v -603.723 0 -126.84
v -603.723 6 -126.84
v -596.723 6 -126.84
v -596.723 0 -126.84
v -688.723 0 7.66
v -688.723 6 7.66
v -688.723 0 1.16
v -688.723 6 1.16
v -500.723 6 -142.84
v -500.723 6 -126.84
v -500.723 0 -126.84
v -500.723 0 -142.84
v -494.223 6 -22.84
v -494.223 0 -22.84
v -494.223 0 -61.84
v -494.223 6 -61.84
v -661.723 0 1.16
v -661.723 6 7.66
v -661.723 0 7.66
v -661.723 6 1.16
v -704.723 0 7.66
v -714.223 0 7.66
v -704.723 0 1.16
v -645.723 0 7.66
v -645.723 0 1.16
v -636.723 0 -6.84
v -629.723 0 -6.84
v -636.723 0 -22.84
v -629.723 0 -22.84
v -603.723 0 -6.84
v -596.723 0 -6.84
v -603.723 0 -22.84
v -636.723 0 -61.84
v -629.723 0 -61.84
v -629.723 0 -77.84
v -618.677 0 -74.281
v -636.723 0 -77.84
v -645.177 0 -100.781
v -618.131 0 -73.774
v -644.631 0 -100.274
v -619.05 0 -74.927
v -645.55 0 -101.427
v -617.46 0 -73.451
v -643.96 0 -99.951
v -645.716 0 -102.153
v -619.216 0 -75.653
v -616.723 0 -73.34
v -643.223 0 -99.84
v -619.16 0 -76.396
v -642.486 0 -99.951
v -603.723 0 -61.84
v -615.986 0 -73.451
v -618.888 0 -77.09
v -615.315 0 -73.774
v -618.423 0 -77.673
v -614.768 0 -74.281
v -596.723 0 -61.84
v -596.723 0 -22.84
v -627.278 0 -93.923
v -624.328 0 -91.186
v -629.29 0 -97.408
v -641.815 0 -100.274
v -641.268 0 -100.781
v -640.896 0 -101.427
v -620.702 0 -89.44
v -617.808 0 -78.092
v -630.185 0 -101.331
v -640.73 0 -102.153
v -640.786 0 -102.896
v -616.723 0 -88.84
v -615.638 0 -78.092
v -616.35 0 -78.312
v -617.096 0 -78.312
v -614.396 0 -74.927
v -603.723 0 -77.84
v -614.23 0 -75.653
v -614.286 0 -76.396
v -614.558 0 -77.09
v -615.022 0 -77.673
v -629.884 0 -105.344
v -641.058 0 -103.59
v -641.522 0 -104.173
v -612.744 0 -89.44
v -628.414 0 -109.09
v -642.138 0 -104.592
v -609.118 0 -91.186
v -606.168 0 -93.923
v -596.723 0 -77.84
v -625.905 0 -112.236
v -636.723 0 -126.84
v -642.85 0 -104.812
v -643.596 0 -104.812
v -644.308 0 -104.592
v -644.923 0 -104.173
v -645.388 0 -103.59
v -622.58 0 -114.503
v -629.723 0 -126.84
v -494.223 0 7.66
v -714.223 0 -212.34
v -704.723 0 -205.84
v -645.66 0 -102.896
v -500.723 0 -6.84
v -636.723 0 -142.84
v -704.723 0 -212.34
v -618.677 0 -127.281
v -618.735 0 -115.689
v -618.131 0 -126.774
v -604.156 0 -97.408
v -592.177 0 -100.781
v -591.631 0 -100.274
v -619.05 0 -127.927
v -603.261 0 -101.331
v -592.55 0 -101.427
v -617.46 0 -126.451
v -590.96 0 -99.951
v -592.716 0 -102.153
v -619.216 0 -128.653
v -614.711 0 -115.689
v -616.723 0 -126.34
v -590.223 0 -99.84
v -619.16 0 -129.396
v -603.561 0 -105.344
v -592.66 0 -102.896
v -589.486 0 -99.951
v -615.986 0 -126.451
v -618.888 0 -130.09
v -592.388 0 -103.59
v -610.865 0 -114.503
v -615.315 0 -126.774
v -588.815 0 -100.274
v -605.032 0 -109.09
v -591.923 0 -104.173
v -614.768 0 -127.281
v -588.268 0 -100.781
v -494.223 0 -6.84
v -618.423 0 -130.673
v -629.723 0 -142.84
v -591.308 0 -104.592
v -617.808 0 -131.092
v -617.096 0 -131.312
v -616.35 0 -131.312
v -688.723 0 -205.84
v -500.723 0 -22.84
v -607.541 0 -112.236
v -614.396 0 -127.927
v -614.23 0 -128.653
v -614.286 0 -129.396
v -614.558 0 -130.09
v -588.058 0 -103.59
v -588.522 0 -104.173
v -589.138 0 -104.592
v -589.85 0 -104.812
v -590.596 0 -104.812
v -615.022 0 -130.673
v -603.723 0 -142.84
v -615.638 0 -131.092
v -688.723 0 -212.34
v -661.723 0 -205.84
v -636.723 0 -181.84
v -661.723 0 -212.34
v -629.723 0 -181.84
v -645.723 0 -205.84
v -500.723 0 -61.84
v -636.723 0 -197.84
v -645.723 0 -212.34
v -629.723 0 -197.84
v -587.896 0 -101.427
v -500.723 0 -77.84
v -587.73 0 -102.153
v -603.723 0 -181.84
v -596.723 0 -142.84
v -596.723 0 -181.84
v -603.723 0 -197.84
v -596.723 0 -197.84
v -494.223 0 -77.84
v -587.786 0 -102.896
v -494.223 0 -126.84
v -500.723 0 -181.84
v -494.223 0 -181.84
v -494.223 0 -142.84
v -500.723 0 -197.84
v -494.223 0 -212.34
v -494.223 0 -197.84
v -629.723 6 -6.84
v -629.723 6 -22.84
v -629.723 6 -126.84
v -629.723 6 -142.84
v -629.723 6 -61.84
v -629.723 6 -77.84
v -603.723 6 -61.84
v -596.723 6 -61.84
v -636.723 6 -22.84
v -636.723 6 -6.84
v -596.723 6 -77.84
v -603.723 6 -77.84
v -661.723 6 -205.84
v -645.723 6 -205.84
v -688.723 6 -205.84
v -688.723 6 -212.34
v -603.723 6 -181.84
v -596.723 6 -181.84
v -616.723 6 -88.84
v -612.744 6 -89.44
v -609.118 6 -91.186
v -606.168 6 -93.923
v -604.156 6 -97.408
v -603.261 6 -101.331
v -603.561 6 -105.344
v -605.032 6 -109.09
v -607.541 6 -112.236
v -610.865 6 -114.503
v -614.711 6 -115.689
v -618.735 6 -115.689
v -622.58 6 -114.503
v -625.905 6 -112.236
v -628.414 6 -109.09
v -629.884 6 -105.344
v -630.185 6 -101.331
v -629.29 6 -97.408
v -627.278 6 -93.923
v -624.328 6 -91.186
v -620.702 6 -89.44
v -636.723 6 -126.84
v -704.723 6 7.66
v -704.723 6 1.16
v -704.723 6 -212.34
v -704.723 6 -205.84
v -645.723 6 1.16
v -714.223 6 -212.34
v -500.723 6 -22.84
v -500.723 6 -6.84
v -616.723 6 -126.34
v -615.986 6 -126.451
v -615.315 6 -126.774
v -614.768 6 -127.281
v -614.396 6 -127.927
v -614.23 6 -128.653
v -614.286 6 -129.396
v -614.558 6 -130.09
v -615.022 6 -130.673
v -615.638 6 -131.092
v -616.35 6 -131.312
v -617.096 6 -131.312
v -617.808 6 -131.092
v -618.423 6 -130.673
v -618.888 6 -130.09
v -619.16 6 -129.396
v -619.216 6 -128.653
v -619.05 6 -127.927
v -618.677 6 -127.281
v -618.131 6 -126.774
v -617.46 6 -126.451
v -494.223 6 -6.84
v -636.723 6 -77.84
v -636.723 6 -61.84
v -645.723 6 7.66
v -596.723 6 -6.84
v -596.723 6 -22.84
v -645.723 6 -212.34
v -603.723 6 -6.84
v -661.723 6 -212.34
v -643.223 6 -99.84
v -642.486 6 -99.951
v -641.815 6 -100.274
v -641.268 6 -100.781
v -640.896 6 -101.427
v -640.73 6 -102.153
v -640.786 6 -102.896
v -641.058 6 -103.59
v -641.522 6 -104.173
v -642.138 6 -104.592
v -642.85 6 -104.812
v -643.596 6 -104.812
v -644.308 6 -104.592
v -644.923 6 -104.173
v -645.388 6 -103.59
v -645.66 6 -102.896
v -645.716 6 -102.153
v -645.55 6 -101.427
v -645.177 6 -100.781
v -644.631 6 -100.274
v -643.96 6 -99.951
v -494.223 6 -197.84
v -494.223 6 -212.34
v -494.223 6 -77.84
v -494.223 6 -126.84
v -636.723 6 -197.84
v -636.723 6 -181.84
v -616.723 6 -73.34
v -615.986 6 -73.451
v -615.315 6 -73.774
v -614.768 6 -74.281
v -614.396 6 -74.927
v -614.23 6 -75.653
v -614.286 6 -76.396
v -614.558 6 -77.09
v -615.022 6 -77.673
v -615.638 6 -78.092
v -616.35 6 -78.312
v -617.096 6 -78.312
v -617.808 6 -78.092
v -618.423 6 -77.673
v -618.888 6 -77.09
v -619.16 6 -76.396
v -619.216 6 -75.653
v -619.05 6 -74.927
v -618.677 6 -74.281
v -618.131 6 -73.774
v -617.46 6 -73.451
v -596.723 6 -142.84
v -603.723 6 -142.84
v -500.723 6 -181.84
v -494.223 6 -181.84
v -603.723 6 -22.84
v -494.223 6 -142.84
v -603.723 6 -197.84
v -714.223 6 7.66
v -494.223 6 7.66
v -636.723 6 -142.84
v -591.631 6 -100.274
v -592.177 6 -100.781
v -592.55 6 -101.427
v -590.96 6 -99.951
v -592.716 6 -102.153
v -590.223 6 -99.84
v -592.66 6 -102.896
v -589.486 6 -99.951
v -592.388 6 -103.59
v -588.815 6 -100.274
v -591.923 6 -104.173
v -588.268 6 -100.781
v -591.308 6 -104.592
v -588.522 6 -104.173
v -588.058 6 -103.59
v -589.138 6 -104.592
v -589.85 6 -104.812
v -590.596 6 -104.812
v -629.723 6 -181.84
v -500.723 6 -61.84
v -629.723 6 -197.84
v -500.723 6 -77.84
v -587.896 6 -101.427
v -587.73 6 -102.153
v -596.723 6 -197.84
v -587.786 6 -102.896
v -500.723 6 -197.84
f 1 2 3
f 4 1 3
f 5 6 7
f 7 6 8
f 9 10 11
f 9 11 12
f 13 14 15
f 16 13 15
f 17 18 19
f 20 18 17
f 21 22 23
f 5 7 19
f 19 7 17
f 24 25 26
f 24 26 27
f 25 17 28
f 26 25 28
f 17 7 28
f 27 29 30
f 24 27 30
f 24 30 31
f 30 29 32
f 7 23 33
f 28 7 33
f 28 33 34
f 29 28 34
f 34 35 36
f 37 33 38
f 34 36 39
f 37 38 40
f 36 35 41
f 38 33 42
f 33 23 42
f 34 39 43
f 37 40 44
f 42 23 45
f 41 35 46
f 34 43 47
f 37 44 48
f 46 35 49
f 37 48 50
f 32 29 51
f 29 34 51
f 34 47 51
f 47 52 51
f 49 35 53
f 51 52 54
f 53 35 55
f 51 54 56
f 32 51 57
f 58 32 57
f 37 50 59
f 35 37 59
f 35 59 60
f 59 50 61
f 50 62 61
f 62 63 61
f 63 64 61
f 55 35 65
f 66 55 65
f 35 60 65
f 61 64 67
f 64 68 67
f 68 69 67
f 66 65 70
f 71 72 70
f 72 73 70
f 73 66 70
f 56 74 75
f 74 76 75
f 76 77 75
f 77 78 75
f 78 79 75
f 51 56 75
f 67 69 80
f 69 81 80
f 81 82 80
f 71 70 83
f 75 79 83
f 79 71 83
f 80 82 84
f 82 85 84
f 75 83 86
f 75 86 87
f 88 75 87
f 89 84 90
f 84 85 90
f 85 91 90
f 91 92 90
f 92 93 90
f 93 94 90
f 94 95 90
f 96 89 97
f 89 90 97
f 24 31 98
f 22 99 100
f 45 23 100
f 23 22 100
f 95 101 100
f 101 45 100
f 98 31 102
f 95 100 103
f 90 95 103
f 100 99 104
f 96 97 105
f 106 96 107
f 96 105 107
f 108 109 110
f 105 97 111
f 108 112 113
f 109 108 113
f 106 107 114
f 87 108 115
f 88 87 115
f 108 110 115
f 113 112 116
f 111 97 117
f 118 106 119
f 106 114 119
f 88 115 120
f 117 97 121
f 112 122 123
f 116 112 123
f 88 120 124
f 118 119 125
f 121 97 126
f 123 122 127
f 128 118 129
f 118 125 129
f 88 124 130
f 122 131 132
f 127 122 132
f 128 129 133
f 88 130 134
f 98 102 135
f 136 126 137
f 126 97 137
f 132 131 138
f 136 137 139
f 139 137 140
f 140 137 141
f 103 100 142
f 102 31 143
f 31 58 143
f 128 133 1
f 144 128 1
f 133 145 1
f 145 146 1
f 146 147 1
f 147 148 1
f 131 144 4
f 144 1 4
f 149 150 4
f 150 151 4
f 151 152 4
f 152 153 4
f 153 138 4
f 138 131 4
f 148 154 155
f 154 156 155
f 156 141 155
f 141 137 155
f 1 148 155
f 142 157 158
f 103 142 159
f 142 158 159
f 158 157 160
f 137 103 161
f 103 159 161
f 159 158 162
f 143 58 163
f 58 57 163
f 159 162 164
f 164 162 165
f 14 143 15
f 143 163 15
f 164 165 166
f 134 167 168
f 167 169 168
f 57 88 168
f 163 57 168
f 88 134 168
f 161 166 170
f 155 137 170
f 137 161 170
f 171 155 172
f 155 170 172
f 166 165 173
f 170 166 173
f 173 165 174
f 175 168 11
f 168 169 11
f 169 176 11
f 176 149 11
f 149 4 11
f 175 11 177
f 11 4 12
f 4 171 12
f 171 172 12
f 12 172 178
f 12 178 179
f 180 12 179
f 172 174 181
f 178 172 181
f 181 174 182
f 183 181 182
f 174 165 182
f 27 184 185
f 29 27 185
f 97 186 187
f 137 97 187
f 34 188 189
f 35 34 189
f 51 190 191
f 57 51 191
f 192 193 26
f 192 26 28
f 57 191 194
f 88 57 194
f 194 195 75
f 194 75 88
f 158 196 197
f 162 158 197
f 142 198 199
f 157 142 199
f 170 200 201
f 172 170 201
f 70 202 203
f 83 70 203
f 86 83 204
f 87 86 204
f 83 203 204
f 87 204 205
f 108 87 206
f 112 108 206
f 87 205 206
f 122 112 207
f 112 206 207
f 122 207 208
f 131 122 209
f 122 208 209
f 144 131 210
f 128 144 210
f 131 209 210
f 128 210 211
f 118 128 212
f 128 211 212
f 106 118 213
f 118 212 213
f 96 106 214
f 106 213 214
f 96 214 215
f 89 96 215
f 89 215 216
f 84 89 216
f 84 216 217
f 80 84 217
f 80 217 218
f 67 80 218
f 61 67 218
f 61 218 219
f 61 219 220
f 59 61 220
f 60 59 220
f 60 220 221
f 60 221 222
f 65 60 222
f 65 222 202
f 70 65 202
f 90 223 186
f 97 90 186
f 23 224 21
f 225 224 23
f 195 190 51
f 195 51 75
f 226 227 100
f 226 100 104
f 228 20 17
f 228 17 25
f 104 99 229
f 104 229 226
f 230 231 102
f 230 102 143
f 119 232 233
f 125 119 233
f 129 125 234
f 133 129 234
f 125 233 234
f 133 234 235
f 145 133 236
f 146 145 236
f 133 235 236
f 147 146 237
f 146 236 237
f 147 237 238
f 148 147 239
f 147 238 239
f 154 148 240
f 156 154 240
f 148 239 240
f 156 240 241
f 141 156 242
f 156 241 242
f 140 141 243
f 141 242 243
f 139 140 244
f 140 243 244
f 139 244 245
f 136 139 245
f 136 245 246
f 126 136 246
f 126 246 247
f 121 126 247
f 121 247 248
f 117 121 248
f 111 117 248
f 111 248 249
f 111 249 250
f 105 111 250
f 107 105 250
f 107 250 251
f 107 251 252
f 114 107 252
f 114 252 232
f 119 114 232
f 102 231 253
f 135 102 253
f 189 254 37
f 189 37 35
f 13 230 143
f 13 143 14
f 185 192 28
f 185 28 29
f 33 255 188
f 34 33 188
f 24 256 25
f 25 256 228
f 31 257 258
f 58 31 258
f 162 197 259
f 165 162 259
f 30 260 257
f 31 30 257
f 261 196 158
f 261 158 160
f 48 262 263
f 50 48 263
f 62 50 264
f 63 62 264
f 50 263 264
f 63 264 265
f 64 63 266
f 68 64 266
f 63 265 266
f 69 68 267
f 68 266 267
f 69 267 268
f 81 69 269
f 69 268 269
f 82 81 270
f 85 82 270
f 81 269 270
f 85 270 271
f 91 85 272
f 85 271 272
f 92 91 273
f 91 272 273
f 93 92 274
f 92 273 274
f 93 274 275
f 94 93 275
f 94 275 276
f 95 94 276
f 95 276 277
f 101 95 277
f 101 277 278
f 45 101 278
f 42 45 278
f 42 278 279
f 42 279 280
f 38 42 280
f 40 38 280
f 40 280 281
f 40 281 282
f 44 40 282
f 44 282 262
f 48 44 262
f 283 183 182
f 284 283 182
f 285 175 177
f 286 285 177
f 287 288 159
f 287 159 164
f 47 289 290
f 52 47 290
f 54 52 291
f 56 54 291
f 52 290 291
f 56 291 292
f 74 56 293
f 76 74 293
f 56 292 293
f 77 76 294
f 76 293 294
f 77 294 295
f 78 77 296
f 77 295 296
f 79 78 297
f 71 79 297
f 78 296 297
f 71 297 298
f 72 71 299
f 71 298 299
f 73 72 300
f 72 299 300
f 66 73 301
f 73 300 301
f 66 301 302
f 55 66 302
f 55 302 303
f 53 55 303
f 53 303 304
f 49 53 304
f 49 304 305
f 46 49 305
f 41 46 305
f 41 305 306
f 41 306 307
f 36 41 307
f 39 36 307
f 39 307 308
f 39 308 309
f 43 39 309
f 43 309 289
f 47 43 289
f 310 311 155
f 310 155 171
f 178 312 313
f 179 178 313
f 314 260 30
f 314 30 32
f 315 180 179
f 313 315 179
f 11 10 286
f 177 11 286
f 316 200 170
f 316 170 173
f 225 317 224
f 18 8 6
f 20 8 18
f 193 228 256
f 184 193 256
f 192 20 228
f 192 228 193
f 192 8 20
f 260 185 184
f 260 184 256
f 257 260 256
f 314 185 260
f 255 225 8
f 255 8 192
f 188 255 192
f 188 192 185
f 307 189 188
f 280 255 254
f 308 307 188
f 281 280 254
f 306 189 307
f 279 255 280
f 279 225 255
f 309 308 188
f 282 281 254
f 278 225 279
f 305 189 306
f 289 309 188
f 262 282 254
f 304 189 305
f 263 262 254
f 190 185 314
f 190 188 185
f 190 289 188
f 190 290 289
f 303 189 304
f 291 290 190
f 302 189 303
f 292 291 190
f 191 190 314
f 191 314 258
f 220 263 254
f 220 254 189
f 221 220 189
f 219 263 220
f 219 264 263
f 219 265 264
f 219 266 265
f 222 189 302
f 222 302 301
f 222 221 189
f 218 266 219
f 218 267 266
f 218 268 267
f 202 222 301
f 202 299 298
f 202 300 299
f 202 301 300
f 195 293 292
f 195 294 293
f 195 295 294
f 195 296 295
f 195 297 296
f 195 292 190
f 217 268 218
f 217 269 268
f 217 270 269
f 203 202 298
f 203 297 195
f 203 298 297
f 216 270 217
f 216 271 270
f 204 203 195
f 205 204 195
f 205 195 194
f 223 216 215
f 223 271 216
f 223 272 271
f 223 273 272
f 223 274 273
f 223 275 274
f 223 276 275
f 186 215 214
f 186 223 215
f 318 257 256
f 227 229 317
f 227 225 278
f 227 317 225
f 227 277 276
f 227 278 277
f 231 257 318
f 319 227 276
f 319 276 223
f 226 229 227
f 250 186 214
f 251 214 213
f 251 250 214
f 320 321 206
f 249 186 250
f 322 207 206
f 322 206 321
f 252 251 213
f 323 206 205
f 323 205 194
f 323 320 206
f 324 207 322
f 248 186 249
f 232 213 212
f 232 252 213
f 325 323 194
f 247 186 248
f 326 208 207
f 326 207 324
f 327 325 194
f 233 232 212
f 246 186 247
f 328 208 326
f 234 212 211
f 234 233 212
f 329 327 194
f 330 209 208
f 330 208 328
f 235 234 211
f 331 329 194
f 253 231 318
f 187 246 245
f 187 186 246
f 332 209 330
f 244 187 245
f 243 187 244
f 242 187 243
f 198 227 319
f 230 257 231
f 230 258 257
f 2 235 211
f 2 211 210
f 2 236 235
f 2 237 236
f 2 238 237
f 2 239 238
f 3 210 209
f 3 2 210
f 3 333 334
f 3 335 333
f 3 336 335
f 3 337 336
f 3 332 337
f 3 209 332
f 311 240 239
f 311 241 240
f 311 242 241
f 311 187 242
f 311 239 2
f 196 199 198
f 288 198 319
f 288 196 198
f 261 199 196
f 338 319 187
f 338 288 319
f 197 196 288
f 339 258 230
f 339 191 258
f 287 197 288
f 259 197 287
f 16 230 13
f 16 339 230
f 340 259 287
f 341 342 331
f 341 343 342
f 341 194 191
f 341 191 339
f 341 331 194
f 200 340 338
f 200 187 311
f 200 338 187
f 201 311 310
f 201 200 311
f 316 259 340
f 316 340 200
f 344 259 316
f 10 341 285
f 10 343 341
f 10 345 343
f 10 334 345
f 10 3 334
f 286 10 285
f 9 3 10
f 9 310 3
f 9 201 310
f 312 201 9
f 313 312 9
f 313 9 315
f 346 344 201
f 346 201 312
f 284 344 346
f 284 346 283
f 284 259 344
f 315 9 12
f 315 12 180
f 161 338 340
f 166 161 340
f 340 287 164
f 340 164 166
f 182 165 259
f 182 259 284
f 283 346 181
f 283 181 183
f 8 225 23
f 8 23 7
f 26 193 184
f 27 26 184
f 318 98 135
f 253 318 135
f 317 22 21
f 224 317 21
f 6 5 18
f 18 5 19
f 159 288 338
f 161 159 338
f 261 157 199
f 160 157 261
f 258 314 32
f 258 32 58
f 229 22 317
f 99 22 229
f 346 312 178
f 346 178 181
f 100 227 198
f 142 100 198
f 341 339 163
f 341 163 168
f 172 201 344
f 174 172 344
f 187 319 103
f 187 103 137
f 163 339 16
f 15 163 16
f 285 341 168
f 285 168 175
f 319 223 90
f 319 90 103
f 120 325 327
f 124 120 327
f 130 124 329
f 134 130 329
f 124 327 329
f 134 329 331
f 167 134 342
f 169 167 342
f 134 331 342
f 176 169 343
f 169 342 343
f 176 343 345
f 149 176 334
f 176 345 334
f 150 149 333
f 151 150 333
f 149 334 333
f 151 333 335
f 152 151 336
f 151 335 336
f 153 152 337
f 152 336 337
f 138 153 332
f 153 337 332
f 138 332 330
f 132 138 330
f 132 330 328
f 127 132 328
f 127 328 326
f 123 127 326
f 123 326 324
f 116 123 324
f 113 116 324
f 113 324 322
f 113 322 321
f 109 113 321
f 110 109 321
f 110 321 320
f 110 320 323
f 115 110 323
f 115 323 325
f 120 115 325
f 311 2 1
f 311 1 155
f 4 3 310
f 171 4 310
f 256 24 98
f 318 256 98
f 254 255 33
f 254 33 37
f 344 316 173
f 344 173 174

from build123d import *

# Parameters (mm, degrees)
SKETCH2_W           = 220
SKETCH2_H           = 220
BOSS_EXTRUDE1_DEPTH = 6
SKETCH3_R           = 13.5
CUT_EXTRUDE1_DEPTH  = 10
SKETCH4_R           = 2.5
CUT_EXTRUDE2_DEPTH  = 10
CAVITY1_START       = -197.339948834
CAVITY1_OUTLINE_W   = 6
CAVITY1_OUTLINE_H   = 6
CAVITY1_DEPTH       = 15
CAVITY1_START_2     = -142.339948834
CAVITY1_2_OUTLINE_W = 6
CAVITY1_2_OUTLINE_H = 6
CAVITY1_2_DEPTH     = 15
CAVITY1_START_3     = -77.339948834
CAVITY1_3_OUTLINE_W = 6
CAVITY1_3_OUTLINE_H = 6
CAVITY1_3_DEPTH     = 15
CAVITY1_START_4     = -22.339948834
CAVITY1_4_OUTLINE_W = 6
CAVITY1_4_OUTLINE_H = 6
CAVITY1_4_DEPTH     = 15
CAVITY1_START_5     = -212.339948834
CAVITY1_5_OUTLINE_W = 15
CAVITY1_5_OUTLINE_H = 6
CAVITY1_5_DEPTH     = 6
CAVITY1_START_6     = 1.660051166
CAVITY1_6_OUTLINE_W = 15
CAVITY1_6_OUTLINE_H = 6
CAVITY1_6_DEPTH     = 6
SKETCH5_W           = 6.5
SKETCH5_H           = 16
SKETCH5_W_2         = 7
SKETCH5_W_3         = 16
SKETCH5_H_2         = 6.5
CUT_EXTRUDE3_DEPTH  = 10


# Read off the part's stored shape, not the designer's step: Cavity1
with BuildPart() as part:
    # Sketch2 → Boss-Extrude1 (new body)
    with BuildSketch(Plane(origin=(0, 0, 0), x_dir=(1, 0, 0), z_dir=(0, 1, 0))):
        with Locations((-604.222894392, 102.339948834)):
            Rectangle(SKETCH2_W, SKETCH2_H)
    extrude(amount=BOSS_EXTRUDE1_DEPTH)

    # Sketch3 → Cut-Extrude1 (cut)
    with BuildSketch(Plane(origin=(0, 6, 0), x_dir=(1, 0, 0), z_dir=(0, 1, 0))):
        with Locations(Location((-616.722894392, 102.339948834, 0), (0, 0, 270))):
            Circle(SKETCH3_R)
    extrude(amount=-CUT_EXTRUDE1_DEPTH, mode=Mode.SUBTRACT)

    # Sketch4 → Cut-Extrude2 (cut)
    with BuildSketch(Plane(origin=(0, 6, 0), x_dir=(1, 0, 0), z_dir=(0, 1, 0))):
        with Locations(Location((-590.222894392, 102.339948834, 0), (0, 0, 270))):
            Circle(SKETCH4_R)
        with Locations(Location((-616.722894392, 128.839948834, 0), (0, 0, 270))):
            Circle(SKETCH4_R)
        with Locations(Location((-643.222894392, 102.339948834, 0), (0, 0, 270))):
            Circle(SKETCH4_R)
        with Locations(Location((-616.722894392, 75.839948834, 0), (0, 0, 270))):
            Circle(SKETCH4_R)
    extrude(amount=-CUT_EXTRUDE2_DEPTH, mode=Mode.SUBTRACT)

    # Cavity1 outline → Cavity1 (cut)
    with BuildSketch(Plane.XY.offset(CAVITY1_START)):
        with Locations((-633.222894392, 3)):
            Rectangle(CAVITY1_OUTLINE_W, CAVITY1_OUTLINE_H)
        with Locations((-600.222894392, 3)):
            Rectangle(CAVITY1_OUTLINE_W, CAVITY1_OUTLINE_H)
        with Locations((-497.222894392, 3)):
            Rectangle(CAVITY1_OUTLINE_W, CAVITY1_OUTLINE_H)
    extrude(amount=CAVITY1_DEPTH, mode=Mode.SUBTRACT)

    # Cavity1 2 outline → Cavity1 2 (cut)
    with BuildSketch(Plane.XY.offset(CAVITY1_START_2)):
        with Locations((-633.222894392, 3)):
            Rectangle(CAVITY1_2_OUTLINE_W, CAVITY1_2_OUTLINE_H)
        with Locations((-600.222894392, 3)):
            Rectangle(CAVITY1_2_OUTLINE_W, CAVITY1_2_OUTLINE_H)
        with Locations((-497.222894392, 3)):
            Rectangle(CAVITY1_2_OUTLINE_W, CAVITY1_2_OUTLINE_H)
    extrude(amount=CAVITY1_2_DEPTH, mode=Mode.SUBTRACT)

    # Cavity1 3 outline → Cavity1 3 (cut)
    with BuildSketch(Plane.XY.offset(CAVITY1_START_3)):
        with Locations((-633.222894392, 3)):
            Rectangle(CAVITY1_3_OUTLINE_W, CAVITY1_3_OUTLINE_H)
        with Locations((-600.222894392, 3)):
            Rectangle(CAVITY1_3_OUTLINE_W, CAVITY1_3_OUTLINE_H)
        with Locations((-497.222894392, 3)):
            Rectangle(CAVITY1_3_OUTLINE_W, CAVITY1_3_OUTLINE_H)
    extrude(amount=CAVITY1_3_DEPTH, mode=Mode.SUBTRACT)

    # Cavity1 4 outline → Cavity1 4 (cut)
    with BuildSketch(Plane.XY.offset(CAVITY1_START_4)):
        with Locations((-633.222894392, 3)):
            Rectangle(CAVITY1_4_OUTLINE_W, CAVITY1_4_OUTLINE_H)
        with Locations((-600.222894392, 3)):
            Rectangle(CAVITY1_4_OUTLINE_W, CAVITY1_4_OUTLINE_H)
        with Locations((-497.222894392, 3)):
            Rectangle(CAVITY1_4_OUTLINE_W, CAVITY1_4_OUTLINE_H)
    extrude(amount=CAVITY1_4_DEPTH, mode=Mode.SUBTRACT)

    # Cavity1 5 outline → Cavity1 5 (cut)
    with BuildSketch(Plane.XY.offset(CAVITY1_START_5)):
        with Locations((-653.722894392, 3)):
            Rectangle(CAVITY1_5_OUTLINE_W, CAVITY1_5_OUTLINE_H)
        with Locations((-696.722894392, 3)):
            Rectangle(CAVITY1_5_OUTLINE_W, CAVITY1_5_OUTLINE_H)
    extrude(amount=CAVITY1_5_DEPTH, mode=Mode.SUBTRACT)

    # Cavity1 6 outline → Cavity1 6 (cut)
    with BuildSketch(Plane.XY.offset(CAVITY1_START_6)):
        with Locations((-653.722894392, 3)):
            Rectangle(CAVITY1_6_OUTLINE_W, CAVITY1_6_OUTLINE_H)
        with Locations((-696.722894392, 3)):
            Rectangle(CAVITY1_6_OUTLINE_W, CAVITY1_6_OUTLINE_H)
    extrude(amount=CAVITY1_6_DEPTH, mode=Mode.SUBTRACT)

    # Sketch5 → Cut-Extrude3 (cut)
    with BuildSketch(Plane(origin=(0, 6, 0), x_dir=(1, 0, 0), z_dir=(0, 1, 0))):
        with Locations((-497.472894392, 14.839948834)):
            Rectangle(SKETCH5_W, SKETCH5_H)
        with Locations((-497.472894392, 69.839948834)):
            Rectangle(SKETCH5_W, SKETCH5_H)
        with Locations((-497.472894392, 134.839948834)):
            Rectangle(SKETCH5_W, SKETCH5_H)
        with Locations((-497.472894392, 189.839948834)):
            Rectangle(SKETCH5_W, SKETCH5_H)
        with Locations((-600.222894392, 189.839948834)):
            Rectangle(SKETCH5_W_2, SKETCH5_H)
        with Locations((-633.222894392, 189.839948834)):
            Rectangle(SKETCH5_W_2, SKETCH5_H)
        with Locations((-600.222894392, 134.839948834)):
            Rectangle(SKETCH5_W_2, SKETCH5_H)
        with Locations((-600.222894392, 69.839948834)):
            Rectangle(SKETCH5_W_2, SKETCH5_H)
        with Locations((-600.222894392, 14.839948834)):
            Rectangle(SKETCH5_W_2, SKETCH5_H)
        with Locations((-633.222894392, 134.839948834)):
            Rectangle(SKETCH5_W_2, SKETCH5_H)
        with Locations((-633.222894392, 69.839948834)):
            Rectangle(SKETCH5_W_2, SKETCH5_H)
        with Locations((-633.222894392, 14.839948834)):
            Rectangle(SKETCH5_W_2, SKETCH5_H)
        with Locations((-653.722894392, 209.089948834)):
            Rectangle(SKETCH5_W_3, SKETCH5_H_2)
        with Locations((-696.722894392, 209.089948834)):
            Rectangle(SKETCH5_W_3, SKETCH5_H_2)
        with Locations((-653.722894392, -4.410051166)):
            Rectangle(SKETCH5_W_3, SKETCH5_H_2)
        with Locations((-696.722894392, -4.410051166)):
            Rectangle(SKETCH5_W_3, SKETCH5_H_2)
    extrude(amount=-CUT_EXTRUDE3_DEPTH, mode=Mode.SUBTRACT)


solid = part.part
